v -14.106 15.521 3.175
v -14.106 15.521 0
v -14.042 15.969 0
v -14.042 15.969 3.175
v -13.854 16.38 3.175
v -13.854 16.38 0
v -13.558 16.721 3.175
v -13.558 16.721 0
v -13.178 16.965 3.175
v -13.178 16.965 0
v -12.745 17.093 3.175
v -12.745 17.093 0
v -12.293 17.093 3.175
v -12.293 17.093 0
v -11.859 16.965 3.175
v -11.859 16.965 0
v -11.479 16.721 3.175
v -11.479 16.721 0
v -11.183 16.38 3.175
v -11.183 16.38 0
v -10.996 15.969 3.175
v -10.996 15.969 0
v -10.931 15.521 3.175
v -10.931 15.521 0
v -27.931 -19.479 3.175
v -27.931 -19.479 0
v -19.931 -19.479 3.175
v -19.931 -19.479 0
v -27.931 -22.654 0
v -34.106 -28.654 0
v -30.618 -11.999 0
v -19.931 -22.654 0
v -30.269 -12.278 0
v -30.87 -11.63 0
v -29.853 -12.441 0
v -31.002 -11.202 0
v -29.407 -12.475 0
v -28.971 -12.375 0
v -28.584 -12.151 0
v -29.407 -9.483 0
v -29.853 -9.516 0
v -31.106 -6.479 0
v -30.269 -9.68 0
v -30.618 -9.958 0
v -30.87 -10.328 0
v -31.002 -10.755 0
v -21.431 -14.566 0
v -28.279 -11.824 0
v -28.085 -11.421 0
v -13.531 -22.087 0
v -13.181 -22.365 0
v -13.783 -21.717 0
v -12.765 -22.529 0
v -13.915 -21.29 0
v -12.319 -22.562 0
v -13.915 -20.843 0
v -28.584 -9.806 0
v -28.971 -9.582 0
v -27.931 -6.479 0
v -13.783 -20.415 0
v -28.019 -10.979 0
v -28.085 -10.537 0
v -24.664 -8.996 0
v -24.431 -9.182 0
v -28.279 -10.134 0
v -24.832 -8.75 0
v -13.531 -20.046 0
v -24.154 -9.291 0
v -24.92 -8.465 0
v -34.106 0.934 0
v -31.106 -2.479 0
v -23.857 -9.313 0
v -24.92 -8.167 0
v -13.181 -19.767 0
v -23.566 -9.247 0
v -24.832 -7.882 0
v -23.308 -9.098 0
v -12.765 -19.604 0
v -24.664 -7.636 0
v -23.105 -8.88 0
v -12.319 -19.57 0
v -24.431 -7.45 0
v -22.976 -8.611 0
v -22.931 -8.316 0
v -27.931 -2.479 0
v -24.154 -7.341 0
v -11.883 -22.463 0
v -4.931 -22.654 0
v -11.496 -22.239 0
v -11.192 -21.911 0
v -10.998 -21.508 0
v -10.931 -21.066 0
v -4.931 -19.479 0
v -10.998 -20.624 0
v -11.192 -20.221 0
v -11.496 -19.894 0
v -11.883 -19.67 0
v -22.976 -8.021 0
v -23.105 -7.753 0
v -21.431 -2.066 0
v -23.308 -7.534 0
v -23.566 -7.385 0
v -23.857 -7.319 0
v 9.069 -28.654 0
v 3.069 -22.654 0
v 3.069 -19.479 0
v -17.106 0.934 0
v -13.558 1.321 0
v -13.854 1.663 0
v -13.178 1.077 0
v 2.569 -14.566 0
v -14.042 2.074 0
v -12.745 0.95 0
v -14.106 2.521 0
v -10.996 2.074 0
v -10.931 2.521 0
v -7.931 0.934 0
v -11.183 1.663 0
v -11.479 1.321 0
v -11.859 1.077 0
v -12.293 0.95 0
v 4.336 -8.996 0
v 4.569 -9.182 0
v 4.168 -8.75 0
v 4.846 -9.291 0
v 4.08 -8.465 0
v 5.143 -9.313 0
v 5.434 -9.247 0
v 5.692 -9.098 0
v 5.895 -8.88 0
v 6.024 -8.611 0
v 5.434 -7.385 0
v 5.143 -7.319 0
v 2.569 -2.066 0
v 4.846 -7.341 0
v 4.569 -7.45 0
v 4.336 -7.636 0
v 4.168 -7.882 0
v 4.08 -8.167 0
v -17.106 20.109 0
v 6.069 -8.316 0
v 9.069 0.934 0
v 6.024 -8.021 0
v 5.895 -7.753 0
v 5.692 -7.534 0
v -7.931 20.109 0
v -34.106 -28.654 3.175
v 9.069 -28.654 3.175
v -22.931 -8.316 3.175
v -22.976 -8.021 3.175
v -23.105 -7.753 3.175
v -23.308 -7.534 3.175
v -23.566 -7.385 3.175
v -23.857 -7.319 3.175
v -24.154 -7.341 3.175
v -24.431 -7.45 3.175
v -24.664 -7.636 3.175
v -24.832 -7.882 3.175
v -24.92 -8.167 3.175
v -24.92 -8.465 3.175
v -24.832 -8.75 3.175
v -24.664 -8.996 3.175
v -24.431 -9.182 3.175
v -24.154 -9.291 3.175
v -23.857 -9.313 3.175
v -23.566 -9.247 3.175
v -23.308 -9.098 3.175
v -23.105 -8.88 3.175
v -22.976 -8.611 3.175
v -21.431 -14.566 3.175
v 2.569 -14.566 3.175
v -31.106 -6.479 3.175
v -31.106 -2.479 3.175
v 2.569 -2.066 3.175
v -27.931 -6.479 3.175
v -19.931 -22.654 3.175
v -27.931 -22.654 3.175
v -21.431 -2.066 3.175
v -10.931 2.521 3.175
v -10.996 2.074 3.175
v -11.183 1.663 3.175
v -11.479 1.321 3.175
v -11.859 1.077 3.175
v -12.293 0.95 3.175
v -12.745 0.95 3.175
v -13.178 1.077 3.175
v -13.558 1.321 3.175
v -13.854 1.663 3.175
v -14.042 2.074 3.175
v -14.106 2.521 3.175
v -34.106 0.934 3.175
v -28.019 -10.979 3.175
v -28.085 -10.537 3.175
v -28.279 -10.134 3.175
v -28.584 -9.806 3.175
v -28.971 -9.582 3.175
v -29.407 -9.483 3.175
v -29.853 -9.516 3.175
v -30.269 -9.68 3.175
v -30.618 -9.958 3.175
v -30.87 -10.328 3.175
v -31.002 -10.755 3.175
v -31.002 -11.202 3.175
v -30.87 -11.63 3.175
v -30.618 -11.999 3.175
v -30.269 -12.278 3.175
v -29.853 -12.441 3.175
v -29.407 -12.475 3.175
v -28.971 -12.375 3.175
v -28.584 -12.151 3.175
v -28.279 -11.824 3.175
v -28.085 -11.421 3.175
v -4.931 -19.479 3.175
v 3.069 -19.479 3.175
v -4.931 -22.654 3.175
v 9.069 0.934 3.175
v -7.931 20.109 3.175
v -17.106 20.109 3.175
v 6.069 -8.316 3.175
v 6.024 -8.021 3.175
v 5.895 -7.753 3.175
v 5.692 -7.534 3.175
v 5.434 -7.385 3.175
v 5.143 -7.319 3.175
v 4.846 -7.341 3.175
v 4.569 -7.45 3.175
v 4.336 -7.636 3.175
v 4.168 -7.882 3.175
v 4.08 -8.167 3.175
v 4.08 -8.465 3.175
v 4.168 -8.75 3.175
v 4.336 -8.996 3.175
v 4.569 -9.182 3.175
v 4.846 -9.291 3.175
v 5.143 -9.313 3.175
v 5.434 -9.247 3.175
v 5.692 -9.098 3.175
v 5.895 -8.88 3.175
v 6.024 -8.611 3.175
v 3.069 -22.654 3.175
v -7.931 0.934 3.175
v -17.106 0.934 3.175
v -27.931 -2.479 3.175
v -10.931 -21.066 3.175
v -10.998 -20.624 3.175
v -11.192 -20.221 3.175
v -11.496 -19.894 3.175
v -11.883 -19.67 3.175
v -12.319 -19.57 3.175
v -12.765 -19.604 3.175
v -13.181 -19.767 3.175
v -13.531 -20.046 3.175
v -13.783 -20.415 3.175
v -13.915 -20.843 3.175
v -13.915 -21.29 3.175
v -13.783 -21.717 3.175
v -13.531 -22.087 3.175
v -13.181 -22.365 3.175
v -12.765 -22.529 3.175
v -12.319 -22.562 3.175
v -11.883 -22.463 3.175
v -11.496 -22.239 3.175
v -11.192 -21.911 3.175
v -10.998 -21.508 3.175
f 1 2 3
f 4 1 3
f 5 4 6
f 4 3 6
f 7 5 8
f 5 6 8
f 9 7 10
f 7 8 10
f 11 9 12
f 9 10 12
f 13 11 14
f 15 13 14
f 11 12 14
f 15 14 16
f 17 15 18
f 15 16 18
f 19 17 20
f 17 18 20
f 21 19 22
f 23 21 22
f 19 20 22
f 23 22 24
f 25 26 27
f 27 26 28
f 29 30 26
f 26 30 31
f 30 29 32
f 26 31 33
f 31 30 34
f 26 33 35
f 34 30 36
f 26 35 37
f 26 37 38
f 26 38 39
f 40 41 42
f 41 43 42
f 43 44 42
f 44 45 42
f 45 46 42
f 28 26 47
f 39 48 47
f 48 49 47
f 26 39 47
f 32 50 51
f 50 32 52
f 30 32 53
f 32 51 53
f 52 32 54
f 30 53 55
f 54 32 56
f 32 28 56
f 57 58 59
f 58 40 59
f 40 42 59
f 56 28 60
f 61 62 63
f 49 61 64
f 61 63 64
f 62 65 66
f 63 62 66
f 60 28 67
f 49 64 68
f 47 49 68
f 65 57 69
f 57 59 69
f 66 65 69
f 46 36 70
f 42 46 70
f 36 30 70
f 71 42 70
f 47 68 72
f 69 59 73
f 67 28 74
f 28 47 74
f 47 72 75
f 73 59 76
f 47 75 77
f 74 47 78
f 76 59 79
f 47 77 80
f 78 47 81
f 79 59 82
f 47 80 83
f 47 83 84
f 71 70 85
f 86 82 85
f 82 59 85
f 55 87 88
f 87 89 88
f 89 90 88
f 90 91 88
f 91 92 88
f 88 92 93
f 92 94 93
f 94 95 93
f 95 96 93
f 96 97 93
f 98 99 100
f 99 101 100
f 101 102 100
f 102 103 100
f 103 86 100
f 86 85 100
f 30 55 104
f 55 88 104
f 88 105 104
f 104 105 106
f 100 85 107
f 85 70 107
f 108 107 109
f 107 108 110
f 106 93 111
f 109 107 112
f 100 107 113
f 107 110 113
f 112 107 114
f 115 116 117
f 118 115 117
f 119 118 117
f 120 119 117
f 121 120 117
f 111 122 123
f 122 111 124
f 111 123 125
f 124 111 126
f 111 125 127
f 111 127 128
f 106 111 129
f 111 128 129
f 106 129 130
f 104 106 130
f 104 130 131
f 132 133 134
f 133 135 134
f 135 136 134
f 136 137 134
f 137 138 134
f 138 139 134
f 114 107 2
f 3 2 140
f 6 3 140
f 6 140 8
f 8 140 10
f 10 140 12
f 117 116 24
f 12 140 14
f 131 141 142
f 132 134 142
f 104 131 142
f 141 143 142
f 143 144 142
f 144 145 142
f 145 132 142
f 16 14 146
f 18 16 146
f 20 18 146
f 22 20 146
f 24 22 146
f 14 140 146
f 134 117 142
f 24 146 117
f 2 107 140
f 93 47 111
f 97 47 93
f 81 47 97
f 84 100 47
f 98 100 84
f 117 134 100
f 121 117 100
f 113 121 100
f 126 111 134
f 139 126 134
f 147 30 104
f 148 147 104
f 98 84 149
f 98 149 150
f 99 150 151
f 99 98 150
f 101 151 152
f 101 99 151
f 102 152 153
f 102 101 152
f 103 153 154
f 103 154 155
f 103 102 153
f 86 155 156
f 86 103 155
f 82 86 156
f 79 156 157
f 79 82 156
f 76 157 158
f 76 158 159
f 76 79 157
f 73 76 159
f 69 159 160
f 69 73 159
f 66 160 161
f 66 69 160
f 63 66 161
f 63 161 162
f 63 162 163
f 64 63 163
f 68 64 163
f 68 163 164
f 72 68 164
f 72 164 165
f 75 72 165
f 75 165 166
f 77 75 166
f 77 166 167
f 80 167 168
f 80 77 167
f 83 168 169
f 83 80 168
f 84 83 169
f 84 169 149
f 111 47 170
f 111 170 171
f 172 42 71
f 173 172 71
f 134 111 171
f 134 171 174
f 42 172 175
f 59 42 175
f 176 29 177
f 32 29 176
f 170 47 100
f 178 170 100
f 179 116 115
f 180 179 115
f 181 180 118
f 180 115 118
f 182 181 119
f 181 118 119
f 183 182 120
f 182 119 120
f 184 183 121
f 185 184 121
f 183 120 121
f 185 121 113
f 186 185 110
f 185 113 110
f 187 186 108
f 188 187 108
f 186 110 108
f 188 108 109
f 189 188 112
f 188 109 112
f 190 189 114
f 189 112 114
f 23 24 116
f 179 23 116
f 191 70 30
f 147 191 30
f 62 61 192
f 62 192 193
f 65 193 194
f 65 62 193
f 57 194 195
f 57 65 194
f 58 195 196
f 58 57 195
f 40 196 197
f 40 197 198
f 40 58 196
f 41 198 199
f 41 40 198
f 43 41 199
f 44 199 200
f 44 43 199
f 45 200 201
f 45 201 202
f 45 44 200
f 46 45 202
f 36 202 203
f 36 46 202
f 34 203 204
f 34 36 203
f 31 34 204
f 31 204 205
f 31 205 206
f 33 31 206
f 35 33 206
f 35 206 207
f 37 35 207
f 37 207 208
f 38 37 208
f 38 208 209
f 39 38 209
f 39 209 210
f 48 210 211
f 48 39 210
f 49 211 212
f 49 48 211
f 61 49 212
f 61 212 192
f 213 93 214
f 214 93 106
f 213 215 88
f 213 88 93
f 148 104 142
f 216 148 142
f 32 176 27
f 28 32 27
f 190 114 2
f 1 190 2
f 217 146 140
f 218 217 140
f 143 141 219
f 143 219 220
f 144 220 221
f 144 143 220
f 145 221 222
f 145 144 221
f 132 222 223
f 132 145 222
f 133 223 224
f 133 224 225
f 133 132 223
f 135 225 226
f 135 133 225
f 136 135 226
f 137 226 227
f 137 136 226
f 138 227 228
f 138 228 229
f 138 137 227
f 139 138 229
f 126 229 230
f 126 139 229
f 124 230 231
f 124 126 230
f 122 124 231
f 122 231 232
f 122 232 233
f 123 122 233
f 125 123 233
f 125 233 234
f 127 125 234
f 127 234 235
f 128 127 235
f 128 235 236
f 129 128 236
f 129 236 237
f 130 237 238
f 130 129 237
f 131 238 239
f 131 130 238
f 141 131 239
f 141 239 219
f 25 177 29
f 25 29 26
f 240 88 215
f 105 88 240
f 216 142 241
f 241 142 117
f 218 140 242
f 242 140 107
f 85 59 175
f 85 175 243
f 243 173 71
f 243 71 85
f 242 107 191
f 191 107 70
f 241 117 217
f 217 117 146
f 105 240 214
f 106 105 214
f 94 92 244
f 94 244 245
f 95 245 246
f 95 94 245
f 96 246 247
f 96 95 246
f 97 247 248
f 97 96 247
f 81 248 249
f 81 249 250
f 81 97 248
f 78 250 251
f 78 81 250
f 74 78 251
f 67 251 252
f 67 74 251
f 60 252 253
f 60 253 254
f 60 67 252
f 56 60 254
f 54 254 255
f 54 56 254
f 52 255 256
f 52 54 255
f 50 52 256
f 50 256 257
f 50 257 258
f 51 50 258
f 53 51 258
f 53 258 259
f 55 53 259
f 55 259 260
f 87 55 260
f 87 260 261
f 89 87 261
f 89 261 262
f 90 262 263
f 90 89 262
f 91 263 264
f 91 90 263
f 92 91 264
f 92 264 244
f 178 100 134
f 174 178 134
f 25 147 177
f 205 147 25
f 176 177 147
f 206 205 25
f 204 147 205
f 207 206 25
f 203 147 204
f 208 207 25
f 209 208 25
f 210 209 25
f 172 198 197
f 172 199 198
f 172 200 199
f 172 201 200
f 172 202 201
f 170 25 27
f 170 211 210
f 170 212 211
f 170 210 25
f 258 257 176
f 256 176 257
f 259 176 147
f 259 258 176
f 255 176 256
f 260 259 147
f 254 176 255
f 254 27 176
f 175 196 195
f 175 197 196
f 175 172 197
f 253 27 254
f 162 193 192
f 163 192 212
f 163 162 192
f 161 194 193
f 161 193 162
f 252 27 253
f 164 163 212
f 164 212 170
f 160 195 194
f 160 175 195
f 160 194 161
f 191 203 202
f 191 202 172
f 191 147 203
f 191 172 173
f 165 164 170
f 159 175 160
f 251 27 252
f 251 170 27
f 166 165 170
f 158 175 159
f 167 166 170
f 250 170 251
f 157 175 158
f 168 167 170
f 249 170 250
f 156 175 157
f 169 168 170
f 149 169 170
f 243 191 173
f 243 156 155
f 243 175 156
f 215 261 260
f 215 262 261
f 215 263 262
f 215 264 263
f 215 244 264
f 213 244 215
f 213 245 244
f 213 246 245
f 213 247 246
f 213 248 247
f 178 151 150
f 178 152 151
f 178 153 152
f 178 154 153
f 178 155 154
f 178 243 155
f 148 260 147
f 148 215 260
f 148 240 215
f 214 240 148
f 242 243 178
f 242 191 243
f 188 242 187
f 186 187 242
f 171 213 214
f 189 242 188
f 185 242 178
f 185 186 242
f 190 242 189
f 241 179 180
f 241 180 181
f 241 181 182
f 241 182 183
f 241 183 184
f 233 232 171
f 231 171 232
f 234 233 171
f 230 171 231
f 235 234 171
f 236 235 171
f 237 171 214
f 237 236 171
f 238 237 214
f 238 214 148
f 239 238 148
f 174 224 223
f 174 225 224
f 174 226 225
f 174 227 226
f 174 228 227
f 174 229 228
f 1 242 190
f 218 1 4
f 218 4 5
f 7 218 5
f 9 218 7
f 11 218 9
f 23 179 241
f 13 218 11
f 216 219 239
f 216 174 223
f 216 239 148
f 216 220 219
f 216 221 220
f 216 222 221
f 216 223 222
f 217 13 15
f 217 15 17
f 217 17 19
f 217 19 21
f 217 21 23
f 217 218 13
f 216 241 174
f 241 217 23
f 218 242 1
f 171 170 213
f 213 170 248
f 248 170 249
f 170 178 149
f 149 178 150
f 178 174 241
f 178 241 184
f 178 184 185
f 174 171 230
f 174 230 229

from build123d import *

# Parameters (mm, degrees)
F0_W     = 8
F0_H     = 3.175
F0_R     = 1.5
F0_W_2   = 3.175
F0_H_2   = 4
F0_R_2   = 1
F0_W_3   = 24
F0_H_3   = 12.5
F1_DEPTH = 3.175


# Not quite as in the source:
# - a length typed as a fraction of an inch, garbled in the dataset ("3 / 203.2 mm" for 3/8 in), is restored


with BuildPart() as f1:
    # F0 (on Top) → F1 (new body)
    with BuildSketch(Plane.XY):
        Polygon((-34.1063038088, 0.9337500209), (-34.1063038088, -28.6537499791), (9.0686961912, -28.6537499791), (9.0686961912, 0.9337500209), (-7.9313038088, 0.9337500209), (-7.9313038088, 20.1087500209), (-17.1063038088, 20.1087500209), (-17.1063038088, 0.9337500209), align=None)
        with Locations((-23.9313038088, -21.0662499791)):
            Rectangle(F0_W, F0_H, mode=Mode.SUBTRACT)
        with Locations((-29.5188038088, -10.9787499791)):
            Circle(F0_R, mode=Mode.SUBTRACT)
        with Locations((-29.5188038088, -4.4787499791)):
            Rectangle(F0_W_2, F0_H_2, mode=Mode.SUBTRACT)
        with Locations((-23.9313038088, -8.3162499791)):
            Circle(F0_R_2, mode=Mode.SUBTRACT)
        with Locations((-12.4313038088, -21.0662499791)):
            Circle(F0_R, mode=Mode.SUBTRACT)
        with Locations((-0.9313038088, -21.0662499791)):
            Rectangle(F0_W, F0_H, mode=Mode.SUBTRACT)
        with Locations((-9.4313038088, -8.3162499791)):
            Rectangle(F0_W_3, F0_H_3, mode=Mode.SUBTRACT)
        with Locations((5.0686961912, -8.3162499791)):
            Circle(F0_R_2, mode=Mode.SUBTRACT)
        with BuildLine():
            ThreePointArc((-14.1063038088, 15.5212500209), (-12.5188038088, 17.1087500209), (-10.9313038088, 15.5212500209))
            Line((-10.9313038088, 15.5212500209), (-10.9313038088, 2.5212500209))
            ThreePointArc((-10.9313038088, 2.5212500209), (-12.5188038088, 0.9337500209), (-14.1063038088, 2.5212500209))
            Line((-14.1063038088, 2.5212500209), (-14.1063038088, 15.5212500209))
        make_face(mode=Mode.SUBTRACT)
    extrude(amount=F1_DEPTH)


solid = f1.part
